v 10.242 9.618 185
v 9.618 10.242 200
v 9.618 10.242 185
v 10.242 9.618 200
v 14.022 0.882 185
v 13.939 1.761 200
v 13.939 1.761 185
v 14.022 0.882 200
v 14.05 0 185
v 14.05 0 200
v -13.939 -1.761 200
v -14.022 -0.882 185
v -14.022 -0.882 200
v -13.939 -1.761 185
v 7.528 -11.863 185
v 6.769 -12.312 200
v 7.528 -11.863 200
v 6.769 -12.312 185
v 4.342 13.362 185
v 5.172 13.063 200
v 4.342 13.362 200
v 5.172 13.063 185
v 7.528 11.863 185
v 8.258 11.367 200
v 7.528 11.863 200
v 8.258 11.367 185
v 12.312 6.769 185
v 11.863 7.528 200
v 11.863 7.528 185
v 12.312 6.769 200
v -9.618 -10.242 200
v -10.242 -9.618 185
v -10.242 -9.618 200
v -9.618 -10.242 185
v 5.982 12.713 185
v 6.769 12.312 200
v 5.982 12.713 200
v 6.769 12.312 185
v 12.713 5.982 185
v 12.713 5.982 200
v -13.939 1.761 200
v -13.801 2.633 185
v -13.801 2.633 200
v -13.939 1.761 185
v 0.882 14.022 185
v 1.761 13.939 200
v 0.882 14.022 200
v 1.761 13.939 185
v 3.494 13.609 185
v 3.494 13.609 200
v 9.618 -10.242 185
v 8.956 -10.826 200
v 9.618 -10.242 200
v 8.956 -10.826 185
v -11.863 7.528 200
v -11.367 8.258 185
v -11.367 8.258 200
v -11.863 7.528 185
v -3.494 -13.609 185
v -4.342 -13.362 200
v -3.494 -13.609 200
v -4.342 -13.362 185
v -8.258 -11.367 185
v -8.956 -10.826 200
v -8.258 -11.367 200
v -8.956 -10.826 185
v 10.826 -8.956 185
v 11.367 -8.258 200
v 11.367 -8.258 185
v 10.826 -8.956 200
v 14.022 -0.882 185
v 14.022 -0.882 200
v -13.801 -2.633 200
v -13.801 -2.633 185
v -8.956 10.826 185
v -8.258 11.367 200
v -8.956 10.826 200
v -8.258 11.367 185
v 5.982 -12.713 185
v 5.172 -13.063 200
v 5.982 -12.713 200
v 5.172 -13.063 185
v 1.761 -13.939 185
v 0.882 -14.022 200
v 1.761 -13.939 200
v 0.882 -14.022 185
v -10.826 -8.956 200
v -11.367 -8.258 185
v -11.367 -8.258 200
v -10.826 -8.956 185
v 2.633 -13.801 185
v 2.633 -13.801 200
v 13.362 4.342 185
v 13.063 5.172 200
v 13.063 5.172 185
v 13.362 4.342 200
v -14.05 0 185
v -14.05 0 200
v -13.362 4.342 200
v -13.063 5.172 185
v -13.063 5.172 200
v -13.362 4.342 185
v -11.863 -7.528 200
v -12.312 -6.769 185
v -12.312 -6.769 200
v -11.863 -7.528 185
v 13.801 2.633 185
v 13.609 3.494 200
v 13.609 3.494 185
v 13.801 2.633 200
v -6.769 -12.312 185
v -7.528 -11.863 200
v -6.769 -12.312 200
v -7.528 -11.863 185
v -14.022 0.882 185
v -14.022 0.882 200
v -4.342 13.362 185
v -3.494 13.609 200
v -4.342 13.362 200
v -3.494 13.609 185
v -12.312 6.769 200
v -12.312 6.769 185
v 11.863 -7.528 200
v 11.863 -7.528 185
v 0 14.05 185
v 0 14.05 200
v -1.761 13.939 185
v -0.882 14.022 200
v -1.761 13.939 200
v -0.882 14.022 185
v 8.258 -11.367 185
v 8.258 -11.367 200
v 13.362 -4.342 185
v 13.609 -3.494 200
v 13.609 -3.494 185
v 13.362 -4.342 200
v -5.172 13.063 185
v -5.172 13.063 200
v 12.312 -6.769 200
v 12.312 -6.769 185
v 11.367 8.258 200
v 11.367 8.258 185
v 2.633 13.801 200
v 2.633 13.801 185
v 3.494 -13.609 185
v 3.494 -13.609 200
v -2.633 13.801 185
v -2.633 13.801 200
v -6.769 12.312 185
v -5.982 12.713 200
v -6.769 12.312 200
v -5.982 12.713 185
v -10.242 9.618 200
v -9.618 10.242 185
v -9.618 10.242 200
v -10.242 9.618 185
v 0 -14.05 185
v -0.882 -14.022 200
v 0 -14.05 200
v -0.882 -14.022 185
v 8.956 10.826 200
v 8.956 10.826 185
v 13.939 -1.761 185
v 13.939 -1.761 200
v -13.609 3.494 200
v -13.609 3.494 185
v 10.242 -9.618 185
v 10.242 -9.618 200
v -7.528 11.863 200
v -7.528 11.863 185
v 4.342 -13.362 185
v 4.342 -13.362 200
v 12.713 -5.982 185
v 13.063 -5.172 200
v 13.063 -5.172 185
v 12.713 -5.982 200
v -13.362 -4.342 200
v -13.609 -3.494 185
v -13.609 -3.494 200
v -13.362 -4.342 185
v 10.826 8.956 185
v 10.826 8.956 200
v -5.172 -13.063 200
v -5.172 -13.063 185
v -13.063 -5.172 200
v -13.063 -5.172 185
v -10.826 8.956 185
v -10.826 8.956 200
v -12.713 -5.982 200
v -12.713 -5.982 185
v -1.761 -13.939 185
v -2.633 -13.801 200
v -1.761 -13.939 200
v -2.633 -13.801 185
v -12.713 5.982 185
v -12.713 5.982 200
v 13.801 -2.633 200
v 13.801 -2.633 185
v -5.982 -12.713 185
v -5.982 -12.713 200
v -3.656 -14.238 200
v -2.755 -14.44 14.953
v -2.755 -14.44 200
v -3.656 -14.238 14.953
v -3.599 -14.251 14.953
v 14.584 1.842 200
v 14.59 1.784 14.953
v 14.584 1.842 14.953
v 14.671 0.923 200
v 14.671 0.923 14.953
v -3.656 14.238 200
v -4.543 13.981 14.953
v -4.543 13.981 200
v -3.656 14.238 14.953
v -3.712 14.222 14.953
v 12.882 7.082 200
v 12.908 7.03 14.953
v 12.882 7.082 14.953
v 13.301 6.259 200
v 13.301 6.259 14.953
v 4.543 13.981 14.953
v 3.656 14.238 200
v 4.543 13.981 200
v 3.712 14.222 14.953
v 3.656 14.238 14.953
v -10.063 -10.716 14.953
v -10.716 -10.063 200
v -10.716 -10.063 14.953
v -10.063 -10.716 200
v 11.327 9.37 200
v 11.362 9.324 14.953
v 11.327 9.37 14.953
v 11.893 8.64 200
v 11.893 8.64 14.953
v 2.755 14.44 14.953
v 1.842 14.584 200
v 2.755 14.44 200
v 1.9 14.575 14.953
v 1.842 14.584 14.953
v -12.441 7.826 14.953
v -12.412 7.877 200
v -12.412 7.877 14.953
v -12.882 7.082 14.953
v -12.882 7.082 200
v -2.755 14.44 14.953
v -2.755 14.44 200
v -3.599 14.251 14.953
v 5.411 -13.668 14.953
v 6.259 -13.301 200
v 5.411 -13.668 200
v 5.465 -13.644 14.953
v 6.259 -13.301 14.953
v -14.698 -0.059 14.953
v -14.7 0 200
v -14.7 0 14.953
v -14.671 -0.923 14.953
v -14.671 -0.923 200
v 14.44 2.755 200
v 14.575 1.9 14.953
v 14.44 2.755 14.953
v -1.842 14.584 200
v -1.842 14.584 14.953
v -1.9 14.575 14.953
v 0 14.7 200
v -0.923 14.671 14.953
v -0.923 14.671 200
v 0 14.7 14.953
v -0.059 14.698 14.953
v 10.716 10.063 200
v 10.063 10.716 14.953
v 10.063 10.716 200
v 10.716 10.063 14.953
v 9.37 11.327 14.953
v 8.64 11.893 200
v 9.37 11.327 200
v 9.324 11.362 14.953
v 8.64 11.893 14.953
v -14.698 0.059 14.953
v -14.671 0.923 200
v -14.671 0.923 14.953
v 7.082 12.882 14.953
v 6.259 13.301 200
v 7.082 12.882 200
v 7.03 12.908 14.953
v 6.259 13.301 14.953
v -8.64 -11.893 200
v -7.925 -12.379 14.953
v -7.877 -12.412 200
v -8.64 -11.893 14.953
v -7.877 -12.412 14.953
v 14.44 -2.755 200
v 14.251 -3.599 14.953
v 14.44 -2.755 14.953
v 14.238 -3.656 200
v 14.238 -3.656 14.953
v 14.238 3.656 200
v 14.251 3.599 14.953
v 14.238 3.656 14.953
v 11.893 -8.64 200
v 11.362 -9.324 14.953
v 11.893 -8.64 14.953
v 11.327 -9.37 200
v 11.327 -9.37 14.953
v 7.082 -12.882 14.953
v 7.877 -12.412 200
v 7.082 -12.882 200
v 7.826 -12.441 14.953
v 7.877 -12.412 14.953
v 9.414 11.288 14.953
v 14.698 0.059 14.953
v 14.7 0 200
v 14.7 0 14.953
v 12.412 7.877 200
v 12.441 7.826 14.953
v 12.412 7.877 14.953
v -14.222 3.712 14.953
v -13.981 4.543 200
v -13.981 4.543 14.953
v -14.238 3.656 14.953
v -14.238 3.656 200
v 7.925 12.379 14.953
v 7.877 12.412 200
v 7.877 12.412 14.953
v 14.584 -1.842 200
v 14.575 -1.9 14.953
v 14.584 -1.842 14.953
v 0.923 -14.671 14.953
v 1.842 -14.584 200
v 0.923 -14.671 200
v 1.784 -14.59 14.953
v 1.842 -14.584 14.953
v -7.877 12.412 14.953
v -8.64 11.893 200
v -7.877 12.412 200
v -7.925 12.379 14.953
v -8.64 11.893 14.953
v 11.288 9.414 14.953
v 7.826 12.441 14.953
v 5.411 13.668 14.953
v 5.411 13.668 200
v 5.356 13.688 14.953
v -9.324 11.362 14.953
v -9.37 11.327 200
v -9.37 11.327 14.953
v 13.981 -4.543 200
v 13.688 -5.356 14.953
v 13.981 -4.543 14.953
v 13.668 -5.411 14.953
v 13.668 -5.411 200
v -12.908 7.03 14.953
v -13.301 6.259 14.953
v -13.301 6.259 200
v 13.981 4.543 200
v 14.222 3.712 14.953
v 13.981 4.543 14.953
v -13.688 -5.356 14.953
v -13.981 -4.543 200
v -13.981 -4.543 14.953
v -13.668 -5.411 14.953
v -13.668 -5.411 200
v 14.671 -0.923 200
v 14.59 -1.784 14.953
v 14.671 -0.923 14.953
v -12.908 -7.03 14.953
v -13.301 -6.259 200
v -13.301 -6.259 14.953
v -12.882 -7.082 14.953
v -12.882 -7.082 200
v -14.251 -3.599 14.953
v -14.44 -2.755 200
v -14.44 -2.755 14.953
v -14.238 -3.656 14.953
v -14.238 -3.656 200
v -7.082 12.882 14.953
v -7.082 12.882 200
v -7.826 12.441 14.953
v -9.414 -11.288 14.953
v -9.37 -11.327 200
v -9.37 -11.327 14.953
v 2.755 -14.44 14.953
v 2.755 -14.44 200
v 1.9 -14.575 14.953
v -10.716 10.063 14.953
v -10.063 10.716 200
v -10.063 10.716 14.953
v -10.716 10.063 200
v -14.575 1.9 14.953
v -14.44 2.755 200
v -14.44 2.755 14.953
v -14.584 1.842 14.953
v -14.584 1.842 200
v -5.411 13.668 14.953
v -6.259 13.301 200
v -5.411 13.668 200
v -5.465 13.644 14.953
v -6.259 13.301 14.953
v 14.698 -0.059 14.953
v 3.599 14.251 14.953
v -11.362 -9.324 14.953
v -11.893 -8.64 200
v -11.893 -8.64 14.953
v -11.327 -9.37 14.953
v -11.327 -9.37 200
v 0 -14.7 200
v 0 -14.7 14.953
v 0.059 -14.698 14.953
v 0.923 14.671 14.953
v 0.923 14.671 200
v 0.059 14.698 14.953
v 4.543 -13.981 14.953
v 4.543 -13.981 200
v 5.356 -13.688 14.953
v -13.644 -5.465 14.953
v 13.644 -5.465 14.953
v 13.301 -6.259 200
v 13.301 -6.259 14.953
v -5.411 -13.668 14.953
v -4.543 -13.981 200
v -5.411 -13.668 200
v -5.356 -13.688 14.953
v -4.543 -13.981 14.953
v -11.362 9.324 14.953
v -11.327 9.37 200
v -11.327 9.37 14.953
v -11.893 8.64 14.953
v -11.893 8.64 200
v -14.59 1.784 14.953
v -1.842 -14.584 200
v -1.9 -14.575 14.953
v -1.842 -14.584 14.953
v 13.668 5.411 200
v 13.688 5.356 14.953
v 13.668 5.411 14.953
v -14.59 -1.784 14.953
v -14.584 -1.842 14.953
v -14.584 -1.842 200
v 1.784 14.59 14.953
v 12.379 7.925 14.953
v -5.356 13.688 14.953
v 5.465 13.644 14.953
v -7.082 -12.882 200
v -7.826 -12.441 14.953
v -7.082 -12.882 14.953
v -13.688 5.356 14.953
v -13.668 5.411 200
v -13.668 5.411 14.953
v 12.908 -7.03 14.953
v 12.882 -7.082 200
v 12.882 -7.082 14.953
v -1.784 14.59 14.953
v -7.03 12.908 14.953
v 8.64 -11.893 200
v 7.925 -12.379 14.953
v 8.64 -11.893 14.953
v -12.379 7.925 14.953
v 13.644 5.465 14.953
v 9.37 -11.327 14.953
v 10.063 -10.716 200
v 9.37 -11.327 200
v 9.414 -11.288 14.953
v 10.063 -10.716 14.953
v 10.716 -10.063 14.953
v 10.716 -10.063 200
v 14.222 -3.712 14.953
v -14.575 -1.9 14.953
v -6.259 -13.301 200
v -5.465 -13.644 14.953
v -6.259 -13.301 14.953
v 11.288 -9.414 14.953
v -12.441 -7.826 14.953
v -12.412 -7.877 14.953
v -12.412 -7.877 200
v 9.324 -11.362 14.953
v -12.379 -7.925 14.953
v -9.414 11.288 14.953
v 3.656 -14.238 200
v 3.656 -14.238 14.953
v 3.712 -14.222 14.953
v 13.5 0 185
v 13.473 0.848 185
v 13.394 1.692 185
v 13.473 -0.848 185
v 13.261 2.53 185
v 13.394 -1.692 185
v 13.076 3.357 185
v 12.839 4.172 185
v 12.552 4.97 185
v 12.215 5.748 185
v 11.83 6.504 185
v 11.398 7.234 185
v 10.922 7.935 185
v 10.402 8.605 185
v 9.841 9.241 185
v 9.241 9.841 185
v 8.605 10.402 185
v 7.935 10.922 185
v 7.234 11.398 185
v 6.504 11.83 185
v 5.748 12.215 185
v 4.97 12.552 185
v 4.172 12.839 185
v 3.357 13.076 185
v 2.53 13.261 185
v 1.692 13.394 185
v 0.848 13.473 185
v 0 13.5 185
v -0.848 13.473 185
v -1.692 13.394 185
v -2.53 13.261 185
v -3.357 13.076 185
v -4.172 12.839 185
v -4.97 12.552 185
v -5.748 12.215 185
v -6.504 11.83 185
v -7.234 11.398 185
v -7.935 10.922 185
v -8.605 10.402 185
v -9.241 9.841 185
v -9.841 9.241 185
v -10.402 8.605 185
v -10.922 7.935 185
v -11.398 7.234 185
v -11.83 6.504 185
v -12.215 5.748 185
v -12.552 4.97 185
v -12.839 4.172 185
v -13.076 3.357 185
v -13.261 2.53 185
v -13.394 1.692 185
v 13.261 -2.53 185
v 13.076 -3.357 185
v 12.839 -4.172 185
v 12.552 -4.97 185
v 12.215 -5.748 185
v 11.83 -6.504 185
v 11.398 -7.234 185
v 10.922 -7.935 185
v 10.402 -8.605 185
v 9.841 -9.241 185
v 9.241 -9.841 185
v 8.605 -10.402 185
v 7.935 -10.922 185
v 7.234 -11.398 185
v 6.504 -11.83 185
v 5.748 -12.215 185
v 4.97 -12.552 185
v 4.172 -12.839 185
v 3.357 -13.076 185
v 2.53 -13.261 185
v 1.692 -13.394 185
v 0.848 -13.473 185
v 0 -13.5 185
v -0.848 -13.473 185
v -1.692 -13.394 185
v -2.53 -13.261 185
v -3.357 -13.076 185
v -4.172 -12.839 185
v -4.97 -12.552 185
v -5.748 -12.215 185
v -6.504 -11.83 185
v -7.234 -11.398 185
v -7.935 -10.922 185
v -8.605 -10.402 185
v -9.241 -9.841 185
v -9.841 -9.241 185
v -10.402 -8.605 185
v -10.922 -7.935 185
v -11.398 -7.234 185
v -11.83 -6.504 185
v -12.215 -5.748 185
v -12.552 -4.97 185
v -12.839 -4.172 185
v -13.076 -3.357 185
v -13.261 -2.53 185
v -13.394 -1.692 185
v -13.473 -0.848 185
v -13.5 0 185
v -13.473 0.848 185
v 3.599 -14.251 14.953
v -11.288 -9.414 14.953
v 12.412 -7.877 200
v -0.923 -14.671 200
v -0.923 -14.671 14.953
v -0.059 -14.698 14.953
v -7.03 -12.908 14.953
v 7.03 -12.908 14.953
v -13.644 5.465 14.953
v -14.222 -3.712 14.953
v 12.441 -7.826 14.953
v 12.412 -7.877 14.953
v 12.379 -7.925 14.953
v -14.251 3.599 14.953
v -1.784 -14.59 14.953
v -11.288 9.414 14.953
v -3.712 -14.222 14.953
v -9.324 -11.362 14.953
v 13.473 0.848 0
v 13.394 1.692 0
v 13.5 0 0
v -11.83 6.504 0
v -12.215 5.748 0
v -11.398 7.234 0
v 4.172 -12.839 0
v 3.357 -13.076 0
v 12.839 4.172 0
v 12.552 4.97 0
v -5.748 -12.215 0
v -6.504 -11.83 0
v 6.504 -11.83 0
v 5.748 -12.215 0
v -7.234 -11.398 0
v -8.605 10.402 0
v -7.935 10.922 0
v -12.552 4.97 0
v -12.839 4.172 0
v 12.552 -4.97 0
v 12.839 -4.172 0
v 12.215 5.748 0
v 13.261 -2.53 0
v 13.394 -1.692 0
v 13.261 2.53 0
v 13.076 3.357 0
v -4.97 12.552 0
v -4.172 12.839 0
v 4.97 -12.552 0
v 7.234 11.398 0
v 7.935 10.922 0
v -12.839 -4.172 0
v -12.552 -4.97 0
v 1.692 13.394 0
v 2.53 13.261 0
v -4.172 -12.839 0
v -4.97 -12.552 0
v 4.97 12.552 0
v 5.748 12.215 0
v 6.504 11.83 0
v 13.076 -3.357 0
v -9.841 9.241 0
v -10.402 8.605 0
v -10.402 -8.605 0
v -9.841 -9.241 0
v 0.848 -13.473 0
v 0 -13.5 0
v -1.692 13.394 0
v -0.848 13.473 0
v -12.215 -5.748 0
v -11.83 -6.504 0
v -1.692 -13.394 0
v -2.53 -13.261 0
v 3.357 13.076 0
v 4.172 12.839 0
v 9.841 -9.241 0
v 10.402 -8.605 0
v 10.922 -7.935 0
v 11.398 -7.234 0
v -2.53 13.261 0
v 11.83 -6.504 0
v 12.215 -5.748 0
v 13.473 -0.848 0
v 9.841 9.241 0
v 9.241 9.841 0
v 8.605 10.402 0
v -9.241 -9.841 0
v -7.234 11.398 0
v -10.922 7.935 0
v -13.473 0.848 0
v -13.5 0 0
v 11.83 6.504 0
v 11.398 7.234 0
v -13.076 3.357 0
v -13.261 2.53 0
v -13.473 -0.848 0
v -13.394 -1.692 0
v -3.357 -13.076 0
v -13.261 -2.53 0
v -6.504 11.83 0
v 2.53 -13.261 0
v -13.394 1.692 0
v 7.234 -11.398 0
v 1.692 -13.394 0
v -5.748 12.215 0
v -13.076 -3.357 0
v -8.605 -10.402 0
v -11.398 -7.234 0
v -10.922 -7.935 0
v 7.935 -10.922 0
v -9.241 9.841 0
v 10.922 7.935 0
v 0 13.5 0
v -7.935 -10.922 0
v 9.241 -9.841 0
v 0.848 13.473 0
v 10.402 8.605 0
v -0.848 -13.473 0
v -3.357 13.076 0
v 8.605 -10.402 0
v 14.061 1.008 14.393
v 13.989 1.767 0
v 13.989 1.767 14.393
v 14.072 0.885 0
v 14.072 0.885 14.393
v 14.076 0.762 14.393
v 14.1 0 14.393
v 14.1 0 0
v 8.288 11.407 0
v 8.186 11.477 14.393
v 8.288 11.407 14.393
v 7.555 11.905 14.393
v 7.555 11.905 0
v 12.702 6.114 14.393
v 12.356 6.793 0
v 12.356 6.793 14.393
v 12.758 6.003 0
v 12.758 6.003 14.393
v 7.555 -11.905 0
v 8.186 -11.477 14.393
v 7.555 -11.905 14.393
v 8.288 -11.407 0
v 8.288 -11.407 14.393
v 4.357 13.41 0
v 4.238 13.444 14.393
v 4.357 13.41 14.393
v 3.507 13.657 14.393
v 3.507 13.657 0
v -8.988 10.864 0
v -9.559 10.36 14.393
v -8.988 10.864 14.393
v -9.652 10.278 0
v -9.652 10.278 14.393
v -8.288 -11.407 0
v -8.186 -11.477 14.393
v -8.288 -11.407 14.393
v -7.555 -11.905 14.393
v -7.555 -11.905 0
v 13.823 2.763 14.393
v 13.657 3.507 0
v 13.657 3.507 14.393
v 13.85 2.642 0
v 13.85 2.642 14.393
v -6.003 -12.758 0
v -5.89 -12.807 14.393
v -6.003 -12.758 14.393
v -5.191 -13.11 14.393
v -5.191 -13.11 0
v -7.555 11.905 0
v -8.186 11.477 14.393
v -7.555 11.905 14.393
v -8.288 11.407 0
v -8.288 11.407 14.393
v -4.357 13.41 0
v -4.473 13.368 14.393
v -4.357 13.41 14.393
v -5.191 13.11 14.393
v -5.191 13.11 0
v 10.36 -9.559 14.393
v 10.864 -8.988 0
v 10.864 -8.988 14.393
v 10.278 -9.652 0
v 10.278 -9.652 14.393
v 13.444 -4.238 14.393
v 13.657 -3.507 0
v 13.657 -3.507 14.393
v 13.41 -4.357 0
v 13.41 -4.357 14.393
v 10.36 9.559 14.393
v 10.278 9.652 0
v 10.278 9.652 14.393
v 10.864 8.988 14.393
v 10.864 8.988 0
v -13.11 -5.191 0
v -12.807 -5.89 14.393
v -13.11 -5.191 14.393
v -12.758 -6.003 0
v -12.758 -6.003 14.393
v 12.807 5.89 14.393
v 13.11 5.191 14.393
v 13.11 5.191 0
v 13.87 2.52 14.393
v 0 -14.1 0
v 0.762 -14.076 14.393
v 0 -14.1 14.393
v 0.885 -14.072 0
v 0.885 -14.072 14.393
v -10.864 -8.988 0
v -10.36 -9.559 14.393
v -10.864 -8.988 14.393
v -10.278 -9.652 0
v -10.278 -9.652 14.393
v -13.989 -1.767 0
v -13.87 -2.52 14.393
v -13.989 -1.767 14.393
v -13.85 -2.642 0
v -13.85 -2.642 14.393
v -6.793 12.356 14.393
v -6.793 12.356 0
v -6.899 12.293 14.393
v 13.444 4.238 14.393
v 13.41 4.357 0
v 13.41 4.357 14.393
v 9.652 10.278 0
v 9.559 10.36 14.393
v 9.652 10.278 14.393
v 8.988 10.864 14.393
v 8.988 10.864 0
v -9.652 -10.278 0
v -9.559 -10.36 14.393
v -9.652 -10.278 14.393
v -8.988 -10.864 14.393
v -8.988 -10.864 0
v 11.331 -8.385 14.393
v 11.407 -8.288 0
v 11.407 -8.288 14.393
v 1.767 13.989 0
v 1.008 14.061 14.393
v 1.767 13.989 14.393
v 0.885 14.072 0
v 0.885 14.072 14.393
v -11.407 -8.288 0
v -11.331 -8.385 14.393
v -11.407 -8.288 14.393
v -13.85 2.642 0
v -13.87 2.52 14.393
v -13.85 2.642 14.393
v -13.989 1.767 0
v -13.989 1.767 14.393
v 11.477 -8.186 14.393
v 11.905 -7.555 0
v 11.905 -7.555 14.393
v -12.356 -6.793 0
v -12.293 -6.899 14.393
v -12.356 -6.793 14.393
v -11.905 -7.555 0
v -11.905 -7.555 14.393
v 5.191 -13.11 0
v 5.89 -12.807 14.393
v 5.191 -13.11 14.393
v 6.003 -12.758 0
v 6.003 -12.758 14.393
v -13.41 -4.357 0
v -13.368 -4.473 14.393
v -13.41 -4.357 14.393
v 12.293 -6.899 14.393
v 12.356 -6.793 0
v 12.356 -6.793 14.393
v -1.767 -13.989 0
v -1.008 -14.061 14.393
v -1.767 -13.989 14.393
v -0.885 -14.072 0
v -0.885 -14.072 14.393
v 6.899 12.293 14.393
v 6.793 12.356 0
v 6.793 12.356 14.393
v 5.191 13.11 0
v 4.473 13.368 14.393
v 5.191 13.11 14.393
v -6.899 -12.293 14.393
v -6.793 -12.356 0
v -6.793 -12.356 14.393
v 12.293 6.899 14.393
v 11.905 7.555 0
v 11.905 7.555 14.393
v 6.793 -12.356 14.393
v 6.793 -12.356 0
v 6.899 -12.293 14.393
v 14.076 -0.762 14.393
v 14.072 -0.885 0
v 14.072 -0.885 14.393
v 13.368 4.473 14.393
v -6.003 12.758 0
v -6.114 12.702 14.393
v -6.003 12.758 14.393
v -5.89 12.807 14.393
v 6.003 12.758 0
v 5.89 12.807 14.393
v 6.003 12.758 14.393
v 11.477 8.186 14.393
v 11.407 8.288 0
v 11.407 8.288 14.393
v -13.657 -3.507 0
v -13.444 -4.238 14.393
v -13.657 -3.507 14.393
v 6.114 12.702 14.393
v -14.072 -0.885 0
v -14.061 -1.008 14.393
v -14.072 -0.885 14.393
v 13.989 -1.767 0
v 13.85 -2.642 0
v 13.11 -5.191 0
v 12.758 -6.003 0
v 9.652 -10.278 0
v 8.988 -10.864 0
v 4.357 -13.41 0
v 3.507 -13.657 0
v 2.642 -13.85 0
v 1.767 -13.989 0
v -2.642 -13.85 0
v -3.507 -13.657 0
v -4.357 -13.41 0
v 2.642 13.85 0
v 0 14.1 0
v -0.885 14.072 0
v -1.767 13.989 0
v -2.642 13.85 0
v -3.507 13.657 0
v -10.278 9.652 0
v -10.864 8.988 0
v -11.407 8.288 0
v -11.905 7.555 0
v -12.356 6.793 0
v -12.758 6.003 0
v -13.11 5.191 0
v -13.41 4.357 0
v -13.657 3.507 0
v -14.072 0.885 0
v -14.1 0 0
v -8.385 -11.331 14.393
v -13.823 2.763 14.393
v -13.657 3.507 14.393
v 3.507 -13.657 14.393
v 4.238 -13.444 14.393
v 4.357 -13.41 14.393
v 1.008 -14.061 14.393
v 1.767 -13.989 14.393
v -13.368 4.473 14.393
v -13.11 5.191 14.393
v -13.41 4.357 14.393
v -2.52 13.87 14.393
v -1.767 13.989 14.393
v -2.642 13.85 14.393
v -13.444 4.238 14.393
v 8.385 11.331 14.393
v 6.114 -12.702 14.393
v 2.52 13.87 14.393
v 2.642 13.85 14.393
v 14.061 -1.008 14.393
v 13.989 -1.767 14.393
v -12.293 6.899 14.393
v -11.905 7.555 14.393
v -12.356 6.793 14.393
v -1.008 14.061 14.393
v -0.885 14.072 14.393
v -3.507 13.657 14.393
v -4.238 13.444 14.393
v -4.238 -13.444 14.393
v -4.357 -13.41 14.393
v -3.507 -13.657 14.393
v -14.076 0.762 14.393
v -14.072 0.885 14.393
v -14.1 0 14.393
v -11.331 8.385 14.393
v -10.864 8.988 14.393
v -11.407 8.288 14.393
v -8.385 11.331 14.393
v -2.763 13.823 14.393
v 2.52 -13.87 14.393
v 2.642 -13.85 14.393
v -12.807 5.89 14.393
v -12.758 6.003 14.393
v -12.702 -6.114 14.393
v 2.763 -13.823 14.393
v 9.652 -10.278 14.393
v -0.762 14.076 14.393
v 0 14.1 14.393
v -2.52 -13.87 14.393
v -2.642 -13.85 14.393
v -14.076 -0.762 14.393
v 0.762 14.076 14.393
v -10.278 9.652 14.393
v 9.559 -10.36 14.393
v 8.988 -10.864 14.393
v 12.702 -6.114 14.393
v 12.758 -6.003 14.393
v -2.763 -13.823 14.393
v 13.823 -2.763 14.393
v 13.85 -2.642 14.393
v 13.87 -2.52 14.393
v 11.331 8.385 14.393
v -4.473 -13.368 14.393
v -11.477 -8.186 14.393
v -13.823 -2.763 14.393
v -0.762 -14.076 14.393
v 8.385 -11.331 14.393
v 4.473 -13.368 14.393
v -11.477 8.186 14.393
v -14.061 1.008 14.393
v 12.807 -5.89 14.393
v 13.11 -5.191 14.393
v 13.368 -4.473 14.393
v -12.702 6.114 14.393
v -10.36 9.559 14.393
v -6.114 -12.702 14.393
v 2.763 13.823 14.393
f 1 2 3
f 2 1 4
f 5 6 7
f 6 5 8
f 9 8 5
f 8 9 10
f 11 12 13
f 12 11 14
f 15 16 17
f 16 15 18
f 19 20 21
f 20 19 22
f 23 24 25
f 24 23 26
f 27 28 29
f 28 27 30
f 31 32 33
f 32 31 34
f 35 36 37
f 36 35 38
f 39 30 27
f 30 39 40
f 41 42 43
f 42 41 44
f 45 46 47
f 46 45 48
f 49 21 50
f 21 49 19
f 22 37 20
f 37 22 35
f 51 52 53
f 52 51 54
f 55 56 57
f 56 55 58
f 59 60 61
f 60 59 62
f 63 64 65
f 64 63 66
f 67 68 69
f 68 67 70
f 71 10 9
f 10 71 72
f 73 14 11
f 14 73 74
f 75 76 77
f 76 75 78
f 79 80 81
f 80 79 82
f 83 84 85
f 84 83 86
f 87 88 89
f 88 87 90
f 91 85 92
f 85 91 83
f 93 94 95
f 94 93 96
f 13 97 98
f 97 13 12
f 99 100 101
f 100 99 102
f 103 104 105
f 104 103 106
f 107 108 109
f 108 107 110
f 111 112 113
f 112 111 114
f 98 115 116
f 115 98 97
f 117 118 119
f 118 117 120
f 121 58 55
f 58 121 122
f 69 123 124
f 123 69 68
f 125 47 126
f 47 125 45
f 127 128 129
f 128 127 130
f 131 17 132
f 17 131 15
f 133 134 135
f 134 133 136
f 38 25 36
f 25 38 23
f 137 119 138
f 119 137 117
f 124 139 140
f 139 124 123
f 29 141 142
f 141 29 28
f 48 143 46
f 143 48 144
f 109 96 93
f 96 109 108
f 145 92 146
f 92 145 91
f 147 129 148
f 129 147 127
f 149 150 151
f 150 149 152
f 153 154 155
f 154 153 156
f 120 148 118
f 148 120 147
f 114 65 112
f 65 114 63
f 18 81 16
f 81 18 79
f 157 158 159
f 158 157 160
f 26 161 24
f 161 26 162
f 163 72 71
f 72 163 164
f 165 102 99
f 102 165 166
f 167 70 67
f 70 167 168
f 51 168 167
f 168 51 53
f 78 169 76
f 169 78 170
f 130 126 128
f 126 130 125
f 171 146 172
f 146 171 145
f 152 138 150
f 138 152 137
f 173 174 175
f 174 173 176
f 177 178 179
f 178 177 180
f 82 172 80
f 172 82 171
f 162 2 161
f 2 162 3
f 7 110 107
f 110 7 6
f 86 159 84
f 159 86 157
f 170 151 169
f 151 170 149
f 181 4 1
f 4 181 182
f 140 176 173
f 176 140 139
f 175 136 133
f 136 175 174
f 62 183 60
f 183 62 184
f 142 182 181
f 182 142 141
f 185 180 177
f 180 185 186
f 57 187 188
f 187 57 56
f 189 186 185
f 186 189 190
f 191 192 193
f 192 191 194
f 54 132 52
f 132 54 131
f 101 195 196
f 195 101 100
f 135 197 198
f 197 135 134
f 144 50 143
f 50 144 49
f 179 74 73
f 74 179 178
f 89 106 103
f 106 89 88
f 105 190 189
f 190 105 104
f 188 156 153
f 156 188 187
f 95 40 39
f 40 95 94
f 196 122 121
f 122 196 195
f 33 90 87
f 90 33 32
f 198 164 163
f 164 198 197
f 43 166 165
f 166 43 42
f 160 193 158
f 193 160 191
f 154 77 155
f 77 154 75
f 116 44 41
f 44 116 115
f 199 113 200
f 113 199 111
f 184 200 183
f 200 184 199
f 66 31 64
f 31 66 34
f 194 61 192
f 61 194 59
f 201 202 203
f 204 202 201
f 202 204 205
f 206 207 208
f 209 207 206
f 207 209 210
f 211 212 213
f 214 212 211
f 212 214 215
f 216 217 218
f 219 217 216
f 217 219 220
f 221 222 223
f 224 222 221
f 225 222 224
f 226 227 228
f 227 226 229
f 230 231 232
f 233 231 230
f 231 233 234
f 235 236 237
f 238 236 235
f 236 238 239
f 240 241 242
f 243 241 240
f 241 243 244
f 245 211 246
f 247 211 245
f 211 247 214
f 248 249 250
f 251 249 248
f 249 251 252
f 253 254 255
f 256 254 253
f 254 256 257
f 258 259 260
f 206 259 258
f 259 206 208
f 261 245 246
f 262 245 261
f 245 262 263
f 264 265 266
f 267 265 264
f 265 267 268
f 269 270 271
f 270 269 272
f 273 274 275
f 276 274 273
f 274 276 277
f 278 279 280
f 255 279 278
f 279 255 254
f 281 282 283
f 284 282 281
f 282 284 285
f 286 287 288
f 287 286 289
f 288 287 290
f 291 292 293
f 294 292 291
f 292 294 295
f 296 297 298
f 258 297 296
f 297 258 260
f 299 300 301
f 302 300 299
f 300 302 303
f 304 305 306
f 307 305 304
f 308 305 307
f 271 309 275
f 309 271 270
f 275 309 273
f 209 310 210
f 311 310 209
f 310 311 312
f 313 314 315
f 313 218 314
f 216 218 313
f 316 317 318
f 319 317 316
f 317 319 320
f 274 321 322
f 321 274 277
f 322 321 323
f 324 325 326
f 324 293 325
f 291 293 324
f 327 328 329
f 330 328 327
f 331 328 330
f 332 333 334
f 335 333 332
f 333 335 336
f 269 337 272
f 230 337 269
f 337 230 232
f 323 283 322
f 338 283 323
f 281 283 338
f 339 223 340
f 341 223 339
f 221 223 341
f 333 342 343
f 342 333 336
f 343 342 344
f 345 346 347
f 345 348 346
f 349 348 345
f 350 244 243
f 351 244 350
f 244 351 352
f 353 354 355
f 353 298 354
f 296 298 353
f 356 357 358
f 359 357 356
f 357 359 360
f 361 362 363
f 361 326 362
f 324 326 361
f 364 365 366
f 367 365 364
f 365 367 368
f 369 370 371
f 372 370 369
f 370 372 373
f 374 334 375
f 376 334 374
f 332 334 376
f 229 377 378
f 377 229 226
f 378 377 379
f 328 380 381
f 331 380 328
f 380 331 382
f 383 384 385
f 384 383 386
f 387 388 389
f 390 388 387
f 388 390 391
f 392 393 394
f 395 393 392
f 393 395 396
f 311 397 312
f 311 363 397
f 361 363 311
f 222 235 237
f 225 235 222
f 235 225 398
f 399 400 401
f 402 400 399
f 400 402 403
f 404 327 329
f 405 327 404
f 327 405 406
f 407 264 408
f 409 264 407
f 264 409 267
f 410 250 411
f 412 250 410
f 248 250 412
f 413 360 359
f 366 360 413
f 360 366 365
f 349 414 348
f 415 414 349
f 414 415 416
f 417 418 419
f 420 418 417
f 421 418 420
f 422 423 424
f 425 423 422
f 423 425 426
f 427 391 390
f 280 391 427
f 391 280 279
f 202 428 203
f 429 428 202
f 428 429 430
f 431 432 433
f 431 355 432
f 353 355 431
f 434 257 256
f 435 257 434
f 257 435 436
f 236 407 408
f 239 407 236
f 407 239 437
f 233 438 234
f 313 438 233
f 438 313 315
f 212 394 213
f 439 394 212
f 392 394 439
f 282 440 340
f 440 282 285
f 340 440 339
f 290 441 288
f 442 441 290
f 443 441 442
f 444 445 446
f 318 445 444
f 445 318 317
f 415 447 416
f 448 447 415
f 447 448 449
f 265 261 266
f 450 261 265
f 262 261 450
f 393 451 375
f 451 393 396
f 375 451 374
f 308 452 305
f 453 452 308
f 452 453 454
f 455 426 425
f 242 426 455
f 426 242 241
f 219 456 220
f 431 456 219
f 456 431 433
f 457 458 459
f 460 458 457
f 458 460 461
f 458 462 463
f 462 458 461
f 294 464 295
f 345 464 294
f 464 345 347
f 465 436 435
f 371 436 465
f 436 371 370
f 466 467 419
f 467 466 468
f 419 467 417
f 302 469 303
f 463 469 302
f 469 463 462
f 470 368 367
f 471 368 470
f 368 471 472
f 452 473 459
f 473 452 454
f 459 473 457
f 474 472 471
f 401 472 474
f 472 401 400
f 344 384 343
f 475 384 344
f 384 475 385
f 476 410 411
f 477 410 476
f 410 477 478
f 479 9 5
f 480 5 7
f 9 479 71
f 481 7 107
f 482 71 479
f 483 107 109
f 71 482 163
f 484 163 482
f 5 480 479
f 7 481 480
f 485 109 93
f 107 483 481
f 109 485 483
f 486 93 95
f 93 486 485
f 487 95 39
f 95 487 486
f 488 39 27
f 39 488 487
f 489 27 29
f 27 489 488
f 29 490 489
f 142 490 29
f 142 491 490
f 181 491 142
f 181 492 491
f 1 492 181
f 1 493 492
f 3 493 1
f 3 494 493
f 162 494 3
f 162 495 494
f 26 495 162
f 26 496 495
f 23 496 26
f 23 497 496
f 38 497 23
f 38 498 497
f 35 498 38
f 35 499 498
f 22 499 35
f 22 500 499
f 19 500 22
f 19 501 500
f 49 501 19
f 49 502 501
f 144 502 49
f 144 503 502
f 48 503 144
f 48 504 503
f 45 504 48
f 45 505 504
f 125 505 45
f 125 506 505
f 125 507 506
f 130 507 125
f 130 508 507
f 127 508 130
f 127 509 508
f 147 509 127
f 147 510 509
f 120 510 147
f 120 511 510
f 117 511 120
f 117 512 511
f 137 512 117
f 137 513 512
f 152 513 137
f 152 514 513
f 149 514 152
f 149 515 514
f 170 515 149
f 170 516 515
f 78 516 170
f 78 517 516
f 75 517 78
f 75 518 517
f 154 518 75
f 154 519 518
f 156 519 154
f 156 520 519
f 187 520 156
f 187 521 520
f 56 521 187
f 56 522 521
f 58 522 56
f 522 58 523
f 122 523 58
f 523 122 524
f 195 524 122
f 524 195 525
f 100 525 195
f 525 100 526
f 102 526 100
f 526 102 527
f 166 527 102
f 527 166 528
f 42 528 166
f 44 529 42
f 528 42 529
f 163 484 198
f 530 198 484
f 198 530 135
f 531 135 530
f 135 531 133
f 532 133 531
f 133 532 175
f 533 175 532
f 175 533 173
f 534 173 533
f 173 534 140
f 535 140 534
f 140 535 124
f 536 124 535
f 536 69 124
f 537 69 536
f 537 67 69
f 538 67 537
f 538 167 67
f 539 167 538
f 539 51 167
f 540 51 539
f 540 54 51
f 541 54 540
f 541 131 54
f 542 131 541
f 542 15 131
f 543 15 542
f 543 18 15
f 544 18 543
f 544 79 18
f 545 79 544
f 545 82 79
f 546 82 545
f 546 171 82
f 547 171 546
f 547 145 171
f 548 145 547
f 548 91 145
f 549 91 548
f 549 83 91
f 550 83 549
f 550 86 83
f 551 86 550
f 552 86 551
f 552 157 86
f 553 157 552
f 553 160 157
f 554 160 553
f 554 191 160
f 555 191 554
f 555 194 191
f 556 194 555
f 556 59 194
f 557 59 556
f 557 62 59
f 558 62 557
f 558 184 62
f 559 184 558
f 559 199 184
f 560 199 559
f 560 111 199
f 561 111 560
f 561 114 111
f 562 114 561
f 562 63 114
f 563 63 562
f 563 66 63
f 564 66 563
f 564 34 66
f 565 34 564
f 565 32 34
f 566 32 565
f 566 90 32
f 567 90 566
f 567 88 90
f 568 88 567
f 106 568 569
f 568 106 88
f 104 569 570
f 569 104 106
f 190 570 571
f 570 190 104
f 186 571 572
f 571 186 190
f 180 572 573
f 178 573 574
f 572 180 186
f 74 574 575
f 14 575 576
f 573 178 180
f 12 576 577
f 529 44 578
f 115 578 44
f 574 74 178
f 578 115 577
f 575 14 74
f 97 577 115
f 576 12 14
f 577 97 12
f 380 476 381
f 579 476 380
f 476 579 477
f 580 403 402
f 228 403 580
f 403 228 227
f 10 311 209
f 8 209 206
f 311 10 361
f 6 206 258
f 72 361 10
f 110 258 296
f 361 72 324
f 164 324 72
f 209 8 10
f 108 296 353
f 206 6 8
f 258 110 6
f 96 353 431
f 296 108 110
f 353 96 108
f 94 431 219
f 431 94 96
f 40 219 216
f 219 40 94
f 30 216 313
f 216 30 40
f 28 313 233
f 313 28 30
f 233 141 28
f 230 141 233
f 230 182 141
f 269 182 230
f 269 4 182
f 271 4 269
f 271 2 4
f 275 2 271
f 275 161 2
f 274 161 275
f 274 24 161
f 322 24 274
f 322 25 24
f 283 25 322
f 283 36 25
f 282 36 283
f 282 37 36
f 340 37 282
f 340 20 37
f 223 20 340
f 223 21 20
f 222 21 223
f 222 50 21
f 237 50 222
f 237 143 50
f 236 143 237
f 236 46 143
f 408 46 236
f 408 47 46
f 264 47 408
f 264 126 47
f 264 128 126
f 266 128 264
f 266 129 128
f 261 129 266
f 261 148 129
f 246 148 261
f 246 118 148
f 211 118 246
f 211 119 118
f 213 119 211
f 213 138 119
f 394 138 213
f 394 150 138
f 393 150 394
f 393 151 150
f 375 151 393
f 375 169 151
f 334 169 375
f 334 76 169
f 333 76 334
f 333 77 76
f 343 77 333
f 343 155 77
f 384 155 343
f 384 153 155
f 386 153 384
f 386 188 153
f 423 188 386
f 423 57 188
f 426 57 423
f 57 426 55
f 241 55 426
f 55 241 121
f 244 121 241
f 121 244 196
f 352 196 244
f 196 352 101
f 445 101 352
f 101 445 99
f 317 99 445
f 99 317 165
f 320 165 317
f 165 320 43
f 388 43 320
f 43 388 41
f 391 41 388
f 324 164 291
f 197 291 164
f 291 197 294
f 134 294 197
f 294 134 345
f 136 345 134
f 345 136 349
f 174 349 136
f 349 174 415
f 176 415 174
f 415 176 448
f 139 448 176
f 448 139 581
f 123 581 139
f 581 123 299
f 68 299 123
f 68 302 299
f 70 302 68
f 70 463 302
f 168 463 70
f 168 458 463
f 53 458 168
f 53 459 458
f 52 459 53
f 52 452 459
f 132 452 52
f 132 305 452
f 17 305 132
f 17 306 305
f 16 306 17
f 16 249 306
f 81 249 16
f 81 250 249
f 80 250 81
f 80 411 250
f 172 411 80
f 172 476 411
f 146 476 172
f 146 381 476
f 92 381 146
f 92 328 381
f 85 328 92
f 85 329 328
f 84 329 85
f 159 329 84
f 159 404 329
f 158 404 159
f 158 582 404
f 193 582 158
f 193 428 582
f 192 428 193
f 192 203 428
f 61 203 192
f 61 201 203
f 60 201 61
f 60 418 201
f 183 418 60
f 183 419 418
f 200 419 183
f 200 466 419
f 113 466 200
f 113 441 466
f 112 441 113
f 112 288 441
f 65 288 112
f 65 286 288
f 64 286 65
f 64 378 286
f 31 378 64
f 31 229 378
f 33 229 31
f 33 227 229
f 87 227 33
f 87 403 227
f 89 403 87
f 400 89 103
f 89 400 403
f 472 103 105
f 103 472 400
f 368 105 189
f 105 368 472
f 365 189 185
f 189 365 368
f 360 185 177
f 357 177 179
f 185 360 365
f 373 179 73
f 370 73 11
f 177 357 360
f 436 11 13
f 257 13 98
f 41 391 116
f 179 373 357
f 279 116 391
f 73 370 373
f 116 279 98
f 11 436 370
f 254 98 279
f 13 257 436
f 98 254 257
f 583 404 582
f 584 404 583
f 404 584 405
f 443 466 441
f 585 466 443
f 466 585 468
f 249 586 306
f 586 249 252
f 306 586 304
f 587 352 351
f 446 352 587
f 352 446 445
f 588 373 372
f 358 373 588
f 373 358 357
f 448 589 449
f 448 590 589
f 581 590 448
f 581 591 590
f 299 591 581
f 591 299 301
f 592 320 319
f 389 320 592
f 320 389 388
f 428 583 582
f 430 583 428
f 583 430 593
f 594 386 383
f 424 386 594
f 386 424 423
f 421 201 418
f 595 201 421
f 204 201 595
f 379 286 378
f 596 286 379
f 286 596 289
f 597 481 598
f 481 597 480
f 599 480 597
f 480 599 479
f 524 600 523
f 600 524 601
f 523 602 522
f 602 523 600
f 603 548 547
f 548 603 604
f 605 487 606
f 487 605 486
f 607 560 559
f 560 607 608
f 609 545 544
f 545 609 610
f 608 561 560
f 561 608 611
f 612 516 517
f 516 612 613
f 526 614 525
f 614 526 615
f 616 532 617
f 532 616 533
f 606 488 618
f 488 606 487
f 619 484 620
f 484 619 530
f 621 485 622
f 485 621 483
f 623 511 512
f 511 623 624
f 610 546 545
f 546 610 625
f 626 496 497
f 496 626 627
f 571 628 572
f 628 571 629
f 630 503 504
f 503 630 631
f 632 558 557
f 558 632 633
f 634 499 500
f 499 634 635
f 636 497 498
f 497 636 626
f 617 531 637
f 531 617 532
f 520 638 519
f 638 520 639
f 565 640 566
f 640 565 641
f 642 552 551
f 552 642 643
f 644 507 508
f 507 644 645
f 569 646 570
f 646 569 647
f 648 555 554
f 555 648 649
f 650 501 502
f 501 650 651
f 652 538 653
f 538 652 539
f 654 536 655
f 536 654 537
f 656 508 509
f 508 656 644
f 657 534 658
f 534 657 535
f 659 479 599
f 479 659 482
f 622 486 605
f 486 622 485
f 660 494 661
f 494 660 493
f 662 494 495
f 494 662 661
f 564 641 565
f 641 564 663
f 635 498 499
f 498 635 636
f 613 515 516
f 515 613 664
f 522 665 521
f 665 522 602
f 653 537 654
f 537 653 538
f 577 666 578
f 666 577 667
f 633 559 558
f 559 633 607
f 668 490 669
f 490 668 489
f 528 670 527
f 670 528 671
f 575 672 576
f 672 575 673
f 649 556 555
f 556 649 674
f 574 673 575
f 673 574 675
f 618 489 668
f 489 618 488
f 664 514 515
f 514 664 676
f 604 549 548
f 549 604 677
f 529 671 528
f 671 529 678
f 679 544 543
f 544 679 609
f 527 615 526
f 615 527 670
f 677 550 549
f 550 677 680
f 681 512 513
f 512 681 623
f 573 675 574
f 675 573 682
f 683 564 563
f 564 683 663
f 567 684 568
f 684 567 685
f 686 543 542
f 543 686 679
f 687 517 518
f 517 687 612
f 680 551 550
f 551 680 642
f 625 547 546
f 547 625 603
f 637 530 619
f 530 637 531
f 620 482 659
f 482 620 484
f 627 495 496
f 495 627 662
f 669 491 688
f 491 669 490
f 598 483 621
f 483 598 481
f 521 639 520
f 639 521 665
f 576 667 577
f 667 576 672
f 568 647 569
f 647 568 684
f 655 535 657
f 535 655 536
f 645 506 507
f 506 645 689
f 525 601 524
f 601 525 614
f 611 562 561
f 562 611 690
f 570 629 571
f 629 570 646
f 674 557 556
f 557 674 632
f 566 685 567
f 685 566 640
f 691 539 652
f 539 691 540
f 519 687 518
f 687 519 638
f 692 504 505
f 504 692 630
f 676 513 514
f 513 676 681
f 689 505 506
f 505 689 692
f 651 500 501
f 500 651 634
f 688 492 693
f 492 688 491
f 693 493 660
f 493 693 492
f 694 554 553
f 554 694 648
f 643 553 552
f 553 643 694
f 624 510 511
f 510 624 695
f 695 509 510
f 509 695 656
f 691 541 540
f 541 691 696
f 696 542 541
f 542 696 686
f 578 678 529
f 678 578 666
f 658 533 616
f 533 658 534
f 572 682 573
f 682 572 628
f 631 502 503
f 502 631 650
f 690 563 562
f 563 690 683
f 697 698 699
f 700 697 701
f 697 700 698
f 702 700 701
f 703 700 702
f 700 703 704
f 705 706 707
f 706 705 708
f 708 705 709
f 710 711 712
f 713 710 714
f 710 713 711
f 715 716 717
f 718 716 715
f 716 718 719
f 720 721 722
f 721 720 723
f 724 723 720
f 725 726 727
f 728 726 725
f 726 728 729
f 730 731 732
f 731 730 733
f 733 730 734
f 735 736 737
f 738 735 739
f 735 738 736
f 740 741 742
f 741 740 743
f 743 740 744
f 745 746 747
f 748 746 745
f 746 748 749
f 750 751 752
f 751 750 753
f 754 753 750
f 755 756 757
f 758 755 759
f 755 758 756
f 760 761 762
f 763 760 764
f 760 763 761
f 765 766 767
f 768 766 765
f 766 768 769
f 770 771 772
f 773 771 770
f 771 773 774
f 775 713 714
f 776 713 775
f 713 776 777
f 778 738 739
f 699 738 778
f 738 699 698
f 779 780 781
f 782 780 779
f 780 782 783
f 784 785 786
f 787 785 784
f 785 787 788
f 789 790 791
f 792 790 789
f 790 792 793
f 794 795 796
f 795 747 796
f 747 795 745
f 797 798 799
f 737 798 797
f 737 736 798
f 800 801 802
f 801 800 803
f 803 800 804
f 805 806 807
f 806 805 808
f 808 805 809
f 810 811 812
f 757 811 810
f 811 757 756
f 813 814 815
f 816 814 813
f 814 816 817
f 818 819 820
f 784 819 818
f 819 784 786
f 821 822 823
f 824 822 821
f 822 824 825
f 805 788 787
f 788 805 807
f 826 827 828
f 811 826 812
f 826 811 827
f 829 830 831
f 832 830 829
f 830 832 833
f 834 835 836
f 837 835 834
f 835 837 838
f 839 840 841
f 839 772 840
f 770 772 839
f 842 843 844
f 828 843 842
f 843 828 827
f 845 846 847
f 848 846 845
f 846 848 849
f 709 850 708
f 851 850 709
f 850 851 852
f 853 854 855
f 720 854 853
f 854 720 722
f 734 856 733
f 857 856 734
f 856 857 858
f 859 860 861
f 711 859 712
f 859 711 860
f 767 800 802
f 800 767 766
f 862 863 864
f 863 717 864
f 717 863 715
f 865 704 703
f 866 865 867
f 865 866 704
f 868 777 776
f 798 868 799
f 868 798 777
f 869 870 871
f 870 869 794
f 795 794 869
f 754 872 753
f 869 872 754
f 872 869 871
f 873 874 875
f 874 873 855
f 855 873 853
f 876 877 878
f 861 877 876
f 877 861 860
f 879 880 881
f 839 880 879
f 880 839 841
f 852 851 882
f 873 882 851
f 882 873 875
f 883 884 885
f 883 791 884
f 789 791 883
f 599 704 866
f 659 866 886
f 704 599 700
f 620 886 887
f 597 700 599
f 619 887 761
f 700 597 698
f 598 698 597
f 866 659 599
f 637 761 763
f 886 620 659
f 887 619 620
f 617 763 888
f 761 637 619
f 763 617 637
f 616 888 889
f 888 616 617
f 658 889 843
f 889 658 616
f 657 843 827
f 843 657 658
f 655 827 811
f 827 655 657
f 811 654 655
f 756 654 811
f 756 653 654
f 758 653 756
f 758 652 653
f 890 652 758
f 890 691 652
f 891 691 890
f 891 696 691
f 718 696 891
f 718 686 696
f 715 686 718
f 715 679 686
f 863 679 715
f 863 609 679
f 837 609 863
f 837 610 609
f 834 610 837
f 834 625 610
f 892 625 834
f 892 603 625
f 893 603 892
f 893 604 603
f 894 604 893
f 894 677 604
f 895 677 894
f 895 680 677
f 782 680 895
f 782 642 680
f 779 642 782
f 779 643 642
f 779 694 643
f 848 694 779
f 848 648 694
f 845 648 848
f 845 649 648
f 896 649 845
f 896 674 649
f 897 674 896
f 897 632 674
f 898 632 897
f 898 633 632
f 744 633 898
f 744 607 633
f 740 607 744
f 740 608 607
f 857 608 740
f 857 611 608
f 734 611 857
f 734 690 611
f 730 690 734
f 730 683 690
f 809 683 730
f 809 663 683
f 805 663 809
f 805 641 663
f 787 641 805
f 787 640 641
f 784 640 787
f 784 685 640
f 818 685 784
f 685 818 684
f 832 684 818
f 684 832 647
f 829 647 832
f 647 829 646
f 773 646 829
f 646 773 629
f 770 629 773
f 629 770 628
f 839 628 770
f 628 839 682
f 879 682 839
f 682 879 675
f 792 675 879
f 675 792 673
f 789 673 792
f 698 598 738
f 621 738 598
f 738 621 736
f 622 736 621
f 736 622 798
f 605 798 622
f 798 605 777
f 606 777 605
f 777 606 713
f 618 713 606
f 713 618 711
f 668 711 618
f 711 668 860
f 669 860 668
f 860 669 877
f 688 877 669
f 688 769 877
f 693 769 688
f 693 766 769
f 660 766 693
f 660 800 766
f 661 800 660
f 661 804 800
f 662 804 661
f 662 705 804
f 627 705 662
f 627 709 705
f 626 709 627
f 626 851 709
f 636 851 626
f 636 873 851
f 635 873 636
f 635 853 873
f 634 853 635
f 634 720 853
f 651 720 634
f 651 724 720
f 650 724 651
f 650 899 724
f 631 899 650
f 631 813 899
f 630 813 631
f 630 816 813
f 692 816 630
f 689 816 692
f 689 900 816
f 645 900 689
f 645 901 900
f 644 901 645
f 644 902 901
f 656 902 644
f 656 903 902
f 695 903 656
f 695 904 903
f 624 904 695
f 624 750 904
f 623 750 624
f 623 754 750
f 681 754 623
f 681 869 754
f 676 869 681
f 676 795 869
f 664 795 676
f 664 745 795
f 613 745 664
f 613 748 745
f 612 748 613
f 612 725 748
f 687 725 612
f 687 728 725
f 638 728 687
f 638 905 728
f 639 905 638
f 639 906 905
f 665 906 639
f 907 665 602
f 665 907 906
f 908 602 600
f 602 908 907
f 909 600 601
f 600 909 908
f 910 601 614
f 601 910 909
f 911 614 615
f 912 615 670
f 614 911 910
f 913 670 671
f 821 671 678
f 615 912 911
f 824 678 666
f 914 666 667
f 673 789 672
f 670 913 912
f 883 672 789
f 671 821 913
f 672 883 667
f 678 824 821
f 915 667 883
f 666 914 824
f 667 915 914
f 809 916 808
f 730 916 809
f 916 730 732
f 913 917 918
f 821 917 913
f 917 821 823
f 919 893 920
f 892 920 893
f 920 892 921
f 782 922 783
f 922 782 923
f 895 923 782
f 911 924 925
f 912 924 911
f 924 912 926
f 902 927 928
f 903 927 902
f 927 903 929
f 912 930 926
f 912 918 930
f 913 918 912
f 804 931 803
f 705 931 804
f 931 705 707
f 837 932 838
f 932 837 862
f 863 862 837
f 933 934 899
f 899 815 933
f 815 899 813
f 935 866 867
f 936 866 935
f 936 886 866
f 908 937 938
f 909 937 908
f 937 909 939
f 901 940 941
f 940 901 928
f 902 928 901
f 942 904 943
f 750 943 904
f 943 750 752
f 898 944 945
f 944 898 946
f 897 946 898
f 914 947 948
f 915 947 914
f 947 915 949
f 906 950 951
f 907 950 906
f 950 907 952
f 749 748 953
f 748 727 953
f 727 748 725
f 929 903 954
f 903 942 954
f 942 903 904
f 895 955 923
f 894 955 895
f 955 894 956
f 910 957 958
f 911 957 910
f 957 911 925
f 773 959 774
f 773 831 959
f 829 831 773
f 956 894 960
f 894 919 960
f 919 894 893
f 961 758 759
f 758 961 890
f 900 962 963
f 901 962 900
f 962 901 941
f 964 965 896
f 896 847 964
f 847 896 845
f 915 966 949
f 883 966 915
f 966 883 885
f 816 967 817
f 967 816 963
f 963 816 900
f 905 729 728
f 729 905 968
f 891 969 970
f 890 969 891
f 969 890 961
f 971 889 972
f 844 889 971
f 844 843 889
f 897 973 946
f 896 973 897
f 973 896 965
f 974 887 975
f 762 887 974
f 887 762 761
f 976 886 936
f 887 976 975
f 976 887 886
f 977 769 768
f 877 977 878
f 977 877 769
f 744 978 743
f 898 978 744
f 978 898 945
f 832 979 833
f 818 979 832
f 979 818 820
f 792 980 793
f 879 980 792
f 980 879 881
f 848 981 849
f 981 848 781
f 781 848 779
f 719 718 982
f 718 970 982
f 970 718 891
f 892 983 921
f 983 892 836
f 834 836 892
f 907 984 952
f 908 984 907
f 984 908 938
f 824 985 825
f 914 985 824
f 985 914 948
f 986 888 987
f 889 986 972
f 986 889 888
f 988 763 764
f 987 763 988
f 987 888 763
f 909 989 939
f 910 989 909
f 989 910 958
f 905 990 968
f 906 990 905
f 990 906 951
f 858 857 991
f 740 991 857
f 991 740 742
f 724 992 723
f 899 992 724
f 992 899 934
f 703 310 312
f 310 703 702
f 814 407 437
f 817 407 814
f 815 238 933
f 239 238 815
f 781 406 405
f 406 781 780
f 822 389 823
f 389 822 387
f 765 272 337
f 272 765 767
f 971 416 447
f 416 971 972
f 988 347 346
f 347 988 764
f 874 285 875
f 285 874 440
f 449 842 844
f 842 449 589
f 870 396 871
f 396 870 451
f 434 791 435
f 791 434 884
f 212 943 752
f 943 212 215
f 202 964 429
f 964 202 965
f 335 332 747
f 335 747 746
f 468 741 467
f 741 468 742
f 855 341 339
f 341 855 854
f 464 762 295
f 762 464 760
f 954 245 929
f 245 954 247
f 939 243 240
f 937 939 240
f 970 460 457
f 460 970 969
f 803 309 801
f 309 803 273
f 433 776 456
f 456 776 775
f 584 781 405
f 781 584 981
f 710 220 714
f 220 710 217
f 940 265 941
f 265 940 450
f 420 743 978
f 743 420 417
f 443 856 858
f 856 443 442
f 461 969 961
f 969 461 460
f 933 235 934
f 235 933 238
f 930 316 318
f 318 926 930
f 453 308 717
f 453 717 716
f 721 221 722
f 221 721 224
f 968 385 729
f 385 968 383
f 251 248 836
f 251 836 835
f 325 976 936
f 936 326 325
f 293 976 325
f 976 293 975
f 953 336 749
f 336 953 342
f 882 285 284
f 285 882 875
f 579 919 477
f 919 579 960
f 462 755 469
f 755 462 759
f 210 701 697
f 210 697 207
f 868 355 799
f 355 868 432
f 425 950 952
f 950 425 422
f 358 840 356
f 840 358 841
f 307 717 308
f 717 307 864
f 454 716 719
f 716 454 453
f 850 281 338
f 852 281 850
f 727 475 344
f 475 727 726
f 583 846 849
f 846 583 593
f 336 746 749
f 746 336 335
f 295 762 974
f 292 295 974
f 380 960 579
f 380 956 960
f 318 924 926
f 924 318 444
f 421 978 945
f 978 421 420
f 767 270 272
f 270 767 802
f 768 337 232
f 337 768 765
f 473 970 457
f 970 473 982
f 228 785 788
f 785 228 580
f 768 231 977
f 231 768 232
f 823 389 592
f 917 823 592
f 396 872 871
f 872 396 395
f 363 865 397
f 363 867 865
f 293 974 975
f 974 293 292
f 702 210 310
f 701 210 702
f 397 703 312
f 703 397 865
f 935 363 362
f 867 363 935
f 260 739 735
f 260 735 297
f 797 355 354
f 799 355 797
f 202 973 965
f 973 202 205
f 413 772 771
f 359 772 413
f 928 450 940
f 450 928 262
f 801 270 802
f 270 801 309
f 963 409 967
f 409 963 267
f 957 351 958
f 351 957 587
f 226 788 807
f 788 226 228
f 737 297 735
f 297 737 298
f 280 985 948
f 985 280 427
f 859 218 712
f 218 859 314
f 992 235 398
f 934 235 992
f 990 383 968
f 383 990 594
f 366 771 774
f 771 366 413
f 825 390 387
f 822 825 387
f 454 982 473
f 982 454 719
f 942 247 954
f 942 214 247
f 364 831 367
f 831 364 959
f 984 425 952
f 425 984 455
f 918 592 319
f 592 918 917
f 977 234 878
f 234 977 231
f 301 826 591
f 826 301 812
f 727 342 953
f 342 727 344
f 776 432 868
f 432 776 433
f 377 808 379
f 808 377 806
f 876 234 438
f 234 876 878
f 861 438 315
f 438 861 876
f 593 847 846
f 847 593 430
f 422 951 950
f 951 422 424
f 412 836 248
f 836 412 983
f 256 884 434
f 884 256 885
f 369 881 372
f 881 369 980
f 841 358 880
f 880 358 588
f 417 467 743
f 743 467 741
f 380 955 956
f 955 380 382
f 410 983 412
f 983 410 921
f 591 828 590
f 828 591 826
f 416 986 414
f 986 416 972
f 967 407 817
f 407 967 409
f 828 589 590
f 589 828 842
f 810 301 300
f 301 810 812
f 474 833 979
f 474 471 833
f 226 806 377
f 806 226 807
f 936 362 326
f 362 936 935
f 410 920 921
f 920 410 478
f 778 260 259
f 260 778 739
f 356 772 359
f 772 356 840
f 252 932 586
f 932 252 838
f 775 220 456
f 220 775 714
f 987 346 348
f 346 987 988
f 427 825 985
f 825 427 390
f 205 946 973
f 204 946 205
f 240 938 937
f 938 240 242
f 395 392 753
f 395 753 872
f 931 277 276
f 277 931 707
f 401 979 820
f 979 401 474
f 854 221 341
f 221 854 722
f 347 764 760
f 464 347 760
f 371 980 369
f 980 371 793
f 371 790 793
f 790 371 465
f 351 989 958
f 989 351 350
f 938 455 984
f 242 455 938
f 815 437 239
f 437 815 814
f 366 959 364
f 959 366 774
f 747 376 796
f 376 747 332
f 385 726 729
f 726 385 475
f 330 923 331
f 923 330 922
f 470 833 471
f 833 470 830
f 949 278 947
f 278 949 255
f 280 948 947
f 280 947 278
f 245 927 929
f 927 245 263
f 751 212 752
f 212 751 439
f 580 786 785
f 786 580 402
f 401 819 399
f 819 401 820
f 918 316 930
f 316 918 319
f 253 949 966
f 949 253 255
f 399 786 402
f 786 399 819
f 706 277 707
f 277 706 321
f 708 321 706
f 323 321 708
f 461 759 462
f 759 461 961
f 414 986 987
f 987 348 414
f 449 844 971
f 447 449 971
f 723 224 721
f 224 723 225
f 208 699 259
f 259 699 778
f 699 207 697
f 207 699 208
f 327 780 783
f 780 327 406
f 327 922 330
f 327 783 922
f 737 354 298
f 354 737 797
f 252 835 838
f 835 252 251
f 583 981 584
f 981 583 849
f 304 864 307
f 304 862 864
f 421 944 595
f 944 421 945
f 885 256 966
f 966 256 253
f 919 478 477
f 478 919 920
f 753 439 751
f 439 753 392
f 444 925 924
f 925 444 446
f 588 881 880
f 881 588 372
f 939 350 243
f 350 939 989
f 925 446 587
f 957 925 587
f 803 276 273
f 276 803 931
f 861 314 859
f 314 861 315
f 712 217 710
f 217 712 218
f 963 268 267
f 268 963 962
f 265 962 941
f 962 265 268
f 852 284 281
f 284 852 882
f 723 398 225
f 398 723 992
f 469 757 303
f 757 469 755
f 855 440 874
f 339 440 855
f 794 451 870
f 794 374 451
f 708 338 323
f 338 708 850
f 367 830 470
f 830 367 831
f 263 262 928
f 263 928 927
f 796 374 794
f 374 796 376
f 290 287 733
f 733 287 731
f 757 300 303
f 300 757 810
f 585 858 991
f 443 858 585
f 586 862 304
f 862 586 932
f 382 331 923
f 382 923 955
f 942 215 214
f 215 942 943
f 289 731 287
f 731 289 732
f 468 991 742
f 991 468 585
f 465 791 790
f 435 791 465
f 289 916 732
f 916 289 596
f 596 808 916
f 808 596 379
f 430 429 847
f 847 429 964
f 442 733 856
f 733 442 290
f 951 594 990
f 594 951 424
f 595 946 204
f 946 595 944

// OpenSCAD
// file: components/Fittings.scad
module topFitting(overlap, internalDiameter, wallThicknes, tlrnc=0.1) {
    h = (internalDiameter + wallThicknes - tlrnc - internalDiameter)/2;
    difference() {
        cylinder(h=overlap, d=internalDiameter + 2*wallThicknes);
        cylinder(h=overlap+tlrnc, d=internalDiameter);
        difference() {
            union() {
                cylinder(h=overlap+tlrnc, d=internalDiameter + wallThicknes - tlrnc);
                translate([0,0, -h])
                    cylinder(h=h, d1=internalDiameter, d2=internalDiameter + wallThicknes - tlrnc);
            }
            cylinder(h=overlap + 2*h, d=internalDiameter);
        }
    }
}

module fitting(overlap, internalDiameter, wallThicknes, tlrnc=0.1) {
    difference() {
        cylinder(h=overlap, d=internalDiameter + 2*wallThicknes);
        cylinder(h=overlap + tlrnc, d=internalDiameter);
        difference() {
            h = (wallThicknes + 2*tlrnc)/2;
            cylinder(h=overlap, d=internalDiameter + 2*wallThicknes + tlrnc);
            union() {
                cylinder(h=overlap , d=internalDiameter + wallThicknes);
                translate([0,0,overlap-h])cylinder(h=h, d2=internalDiameter + 2*wallThicknes + tlrnc, d1=internalDiameter + wallThicknes-2*tlrnc);
            }
        }
    }
}

module tube(length, internalDiameter, wallThicknes) {
    difference() {
        cylinder(h=length, d=internalDiameter + 2*wallThicknes);
        cylinder(h=length, d=internalDiameter);
    }
}
// main file
use <components/Fittings.scad>
/// coments
//params

$fn=100;
tlrnc=0.1;
overlap=15;
internalDiameter=27;
perimeter = 0.4;
wallThicknes = 3* perimeter;
length=200;

MainTube(length, internalDiameter, wallThicknes, overlap, tlrnc);

module MainTube(length, internalDiameter, wallThicknes, overlap, tlrnc) {
    translate([0, 0, length - overlap]) topFitting(overlap, internalDiameter, wallThicknes);
    translate([0,0, overlap]) tube(length - 2* overlap, internalDiameter, wallThicknes);
    fitting(overlap, internalDiameter, wallThicknes);
}
